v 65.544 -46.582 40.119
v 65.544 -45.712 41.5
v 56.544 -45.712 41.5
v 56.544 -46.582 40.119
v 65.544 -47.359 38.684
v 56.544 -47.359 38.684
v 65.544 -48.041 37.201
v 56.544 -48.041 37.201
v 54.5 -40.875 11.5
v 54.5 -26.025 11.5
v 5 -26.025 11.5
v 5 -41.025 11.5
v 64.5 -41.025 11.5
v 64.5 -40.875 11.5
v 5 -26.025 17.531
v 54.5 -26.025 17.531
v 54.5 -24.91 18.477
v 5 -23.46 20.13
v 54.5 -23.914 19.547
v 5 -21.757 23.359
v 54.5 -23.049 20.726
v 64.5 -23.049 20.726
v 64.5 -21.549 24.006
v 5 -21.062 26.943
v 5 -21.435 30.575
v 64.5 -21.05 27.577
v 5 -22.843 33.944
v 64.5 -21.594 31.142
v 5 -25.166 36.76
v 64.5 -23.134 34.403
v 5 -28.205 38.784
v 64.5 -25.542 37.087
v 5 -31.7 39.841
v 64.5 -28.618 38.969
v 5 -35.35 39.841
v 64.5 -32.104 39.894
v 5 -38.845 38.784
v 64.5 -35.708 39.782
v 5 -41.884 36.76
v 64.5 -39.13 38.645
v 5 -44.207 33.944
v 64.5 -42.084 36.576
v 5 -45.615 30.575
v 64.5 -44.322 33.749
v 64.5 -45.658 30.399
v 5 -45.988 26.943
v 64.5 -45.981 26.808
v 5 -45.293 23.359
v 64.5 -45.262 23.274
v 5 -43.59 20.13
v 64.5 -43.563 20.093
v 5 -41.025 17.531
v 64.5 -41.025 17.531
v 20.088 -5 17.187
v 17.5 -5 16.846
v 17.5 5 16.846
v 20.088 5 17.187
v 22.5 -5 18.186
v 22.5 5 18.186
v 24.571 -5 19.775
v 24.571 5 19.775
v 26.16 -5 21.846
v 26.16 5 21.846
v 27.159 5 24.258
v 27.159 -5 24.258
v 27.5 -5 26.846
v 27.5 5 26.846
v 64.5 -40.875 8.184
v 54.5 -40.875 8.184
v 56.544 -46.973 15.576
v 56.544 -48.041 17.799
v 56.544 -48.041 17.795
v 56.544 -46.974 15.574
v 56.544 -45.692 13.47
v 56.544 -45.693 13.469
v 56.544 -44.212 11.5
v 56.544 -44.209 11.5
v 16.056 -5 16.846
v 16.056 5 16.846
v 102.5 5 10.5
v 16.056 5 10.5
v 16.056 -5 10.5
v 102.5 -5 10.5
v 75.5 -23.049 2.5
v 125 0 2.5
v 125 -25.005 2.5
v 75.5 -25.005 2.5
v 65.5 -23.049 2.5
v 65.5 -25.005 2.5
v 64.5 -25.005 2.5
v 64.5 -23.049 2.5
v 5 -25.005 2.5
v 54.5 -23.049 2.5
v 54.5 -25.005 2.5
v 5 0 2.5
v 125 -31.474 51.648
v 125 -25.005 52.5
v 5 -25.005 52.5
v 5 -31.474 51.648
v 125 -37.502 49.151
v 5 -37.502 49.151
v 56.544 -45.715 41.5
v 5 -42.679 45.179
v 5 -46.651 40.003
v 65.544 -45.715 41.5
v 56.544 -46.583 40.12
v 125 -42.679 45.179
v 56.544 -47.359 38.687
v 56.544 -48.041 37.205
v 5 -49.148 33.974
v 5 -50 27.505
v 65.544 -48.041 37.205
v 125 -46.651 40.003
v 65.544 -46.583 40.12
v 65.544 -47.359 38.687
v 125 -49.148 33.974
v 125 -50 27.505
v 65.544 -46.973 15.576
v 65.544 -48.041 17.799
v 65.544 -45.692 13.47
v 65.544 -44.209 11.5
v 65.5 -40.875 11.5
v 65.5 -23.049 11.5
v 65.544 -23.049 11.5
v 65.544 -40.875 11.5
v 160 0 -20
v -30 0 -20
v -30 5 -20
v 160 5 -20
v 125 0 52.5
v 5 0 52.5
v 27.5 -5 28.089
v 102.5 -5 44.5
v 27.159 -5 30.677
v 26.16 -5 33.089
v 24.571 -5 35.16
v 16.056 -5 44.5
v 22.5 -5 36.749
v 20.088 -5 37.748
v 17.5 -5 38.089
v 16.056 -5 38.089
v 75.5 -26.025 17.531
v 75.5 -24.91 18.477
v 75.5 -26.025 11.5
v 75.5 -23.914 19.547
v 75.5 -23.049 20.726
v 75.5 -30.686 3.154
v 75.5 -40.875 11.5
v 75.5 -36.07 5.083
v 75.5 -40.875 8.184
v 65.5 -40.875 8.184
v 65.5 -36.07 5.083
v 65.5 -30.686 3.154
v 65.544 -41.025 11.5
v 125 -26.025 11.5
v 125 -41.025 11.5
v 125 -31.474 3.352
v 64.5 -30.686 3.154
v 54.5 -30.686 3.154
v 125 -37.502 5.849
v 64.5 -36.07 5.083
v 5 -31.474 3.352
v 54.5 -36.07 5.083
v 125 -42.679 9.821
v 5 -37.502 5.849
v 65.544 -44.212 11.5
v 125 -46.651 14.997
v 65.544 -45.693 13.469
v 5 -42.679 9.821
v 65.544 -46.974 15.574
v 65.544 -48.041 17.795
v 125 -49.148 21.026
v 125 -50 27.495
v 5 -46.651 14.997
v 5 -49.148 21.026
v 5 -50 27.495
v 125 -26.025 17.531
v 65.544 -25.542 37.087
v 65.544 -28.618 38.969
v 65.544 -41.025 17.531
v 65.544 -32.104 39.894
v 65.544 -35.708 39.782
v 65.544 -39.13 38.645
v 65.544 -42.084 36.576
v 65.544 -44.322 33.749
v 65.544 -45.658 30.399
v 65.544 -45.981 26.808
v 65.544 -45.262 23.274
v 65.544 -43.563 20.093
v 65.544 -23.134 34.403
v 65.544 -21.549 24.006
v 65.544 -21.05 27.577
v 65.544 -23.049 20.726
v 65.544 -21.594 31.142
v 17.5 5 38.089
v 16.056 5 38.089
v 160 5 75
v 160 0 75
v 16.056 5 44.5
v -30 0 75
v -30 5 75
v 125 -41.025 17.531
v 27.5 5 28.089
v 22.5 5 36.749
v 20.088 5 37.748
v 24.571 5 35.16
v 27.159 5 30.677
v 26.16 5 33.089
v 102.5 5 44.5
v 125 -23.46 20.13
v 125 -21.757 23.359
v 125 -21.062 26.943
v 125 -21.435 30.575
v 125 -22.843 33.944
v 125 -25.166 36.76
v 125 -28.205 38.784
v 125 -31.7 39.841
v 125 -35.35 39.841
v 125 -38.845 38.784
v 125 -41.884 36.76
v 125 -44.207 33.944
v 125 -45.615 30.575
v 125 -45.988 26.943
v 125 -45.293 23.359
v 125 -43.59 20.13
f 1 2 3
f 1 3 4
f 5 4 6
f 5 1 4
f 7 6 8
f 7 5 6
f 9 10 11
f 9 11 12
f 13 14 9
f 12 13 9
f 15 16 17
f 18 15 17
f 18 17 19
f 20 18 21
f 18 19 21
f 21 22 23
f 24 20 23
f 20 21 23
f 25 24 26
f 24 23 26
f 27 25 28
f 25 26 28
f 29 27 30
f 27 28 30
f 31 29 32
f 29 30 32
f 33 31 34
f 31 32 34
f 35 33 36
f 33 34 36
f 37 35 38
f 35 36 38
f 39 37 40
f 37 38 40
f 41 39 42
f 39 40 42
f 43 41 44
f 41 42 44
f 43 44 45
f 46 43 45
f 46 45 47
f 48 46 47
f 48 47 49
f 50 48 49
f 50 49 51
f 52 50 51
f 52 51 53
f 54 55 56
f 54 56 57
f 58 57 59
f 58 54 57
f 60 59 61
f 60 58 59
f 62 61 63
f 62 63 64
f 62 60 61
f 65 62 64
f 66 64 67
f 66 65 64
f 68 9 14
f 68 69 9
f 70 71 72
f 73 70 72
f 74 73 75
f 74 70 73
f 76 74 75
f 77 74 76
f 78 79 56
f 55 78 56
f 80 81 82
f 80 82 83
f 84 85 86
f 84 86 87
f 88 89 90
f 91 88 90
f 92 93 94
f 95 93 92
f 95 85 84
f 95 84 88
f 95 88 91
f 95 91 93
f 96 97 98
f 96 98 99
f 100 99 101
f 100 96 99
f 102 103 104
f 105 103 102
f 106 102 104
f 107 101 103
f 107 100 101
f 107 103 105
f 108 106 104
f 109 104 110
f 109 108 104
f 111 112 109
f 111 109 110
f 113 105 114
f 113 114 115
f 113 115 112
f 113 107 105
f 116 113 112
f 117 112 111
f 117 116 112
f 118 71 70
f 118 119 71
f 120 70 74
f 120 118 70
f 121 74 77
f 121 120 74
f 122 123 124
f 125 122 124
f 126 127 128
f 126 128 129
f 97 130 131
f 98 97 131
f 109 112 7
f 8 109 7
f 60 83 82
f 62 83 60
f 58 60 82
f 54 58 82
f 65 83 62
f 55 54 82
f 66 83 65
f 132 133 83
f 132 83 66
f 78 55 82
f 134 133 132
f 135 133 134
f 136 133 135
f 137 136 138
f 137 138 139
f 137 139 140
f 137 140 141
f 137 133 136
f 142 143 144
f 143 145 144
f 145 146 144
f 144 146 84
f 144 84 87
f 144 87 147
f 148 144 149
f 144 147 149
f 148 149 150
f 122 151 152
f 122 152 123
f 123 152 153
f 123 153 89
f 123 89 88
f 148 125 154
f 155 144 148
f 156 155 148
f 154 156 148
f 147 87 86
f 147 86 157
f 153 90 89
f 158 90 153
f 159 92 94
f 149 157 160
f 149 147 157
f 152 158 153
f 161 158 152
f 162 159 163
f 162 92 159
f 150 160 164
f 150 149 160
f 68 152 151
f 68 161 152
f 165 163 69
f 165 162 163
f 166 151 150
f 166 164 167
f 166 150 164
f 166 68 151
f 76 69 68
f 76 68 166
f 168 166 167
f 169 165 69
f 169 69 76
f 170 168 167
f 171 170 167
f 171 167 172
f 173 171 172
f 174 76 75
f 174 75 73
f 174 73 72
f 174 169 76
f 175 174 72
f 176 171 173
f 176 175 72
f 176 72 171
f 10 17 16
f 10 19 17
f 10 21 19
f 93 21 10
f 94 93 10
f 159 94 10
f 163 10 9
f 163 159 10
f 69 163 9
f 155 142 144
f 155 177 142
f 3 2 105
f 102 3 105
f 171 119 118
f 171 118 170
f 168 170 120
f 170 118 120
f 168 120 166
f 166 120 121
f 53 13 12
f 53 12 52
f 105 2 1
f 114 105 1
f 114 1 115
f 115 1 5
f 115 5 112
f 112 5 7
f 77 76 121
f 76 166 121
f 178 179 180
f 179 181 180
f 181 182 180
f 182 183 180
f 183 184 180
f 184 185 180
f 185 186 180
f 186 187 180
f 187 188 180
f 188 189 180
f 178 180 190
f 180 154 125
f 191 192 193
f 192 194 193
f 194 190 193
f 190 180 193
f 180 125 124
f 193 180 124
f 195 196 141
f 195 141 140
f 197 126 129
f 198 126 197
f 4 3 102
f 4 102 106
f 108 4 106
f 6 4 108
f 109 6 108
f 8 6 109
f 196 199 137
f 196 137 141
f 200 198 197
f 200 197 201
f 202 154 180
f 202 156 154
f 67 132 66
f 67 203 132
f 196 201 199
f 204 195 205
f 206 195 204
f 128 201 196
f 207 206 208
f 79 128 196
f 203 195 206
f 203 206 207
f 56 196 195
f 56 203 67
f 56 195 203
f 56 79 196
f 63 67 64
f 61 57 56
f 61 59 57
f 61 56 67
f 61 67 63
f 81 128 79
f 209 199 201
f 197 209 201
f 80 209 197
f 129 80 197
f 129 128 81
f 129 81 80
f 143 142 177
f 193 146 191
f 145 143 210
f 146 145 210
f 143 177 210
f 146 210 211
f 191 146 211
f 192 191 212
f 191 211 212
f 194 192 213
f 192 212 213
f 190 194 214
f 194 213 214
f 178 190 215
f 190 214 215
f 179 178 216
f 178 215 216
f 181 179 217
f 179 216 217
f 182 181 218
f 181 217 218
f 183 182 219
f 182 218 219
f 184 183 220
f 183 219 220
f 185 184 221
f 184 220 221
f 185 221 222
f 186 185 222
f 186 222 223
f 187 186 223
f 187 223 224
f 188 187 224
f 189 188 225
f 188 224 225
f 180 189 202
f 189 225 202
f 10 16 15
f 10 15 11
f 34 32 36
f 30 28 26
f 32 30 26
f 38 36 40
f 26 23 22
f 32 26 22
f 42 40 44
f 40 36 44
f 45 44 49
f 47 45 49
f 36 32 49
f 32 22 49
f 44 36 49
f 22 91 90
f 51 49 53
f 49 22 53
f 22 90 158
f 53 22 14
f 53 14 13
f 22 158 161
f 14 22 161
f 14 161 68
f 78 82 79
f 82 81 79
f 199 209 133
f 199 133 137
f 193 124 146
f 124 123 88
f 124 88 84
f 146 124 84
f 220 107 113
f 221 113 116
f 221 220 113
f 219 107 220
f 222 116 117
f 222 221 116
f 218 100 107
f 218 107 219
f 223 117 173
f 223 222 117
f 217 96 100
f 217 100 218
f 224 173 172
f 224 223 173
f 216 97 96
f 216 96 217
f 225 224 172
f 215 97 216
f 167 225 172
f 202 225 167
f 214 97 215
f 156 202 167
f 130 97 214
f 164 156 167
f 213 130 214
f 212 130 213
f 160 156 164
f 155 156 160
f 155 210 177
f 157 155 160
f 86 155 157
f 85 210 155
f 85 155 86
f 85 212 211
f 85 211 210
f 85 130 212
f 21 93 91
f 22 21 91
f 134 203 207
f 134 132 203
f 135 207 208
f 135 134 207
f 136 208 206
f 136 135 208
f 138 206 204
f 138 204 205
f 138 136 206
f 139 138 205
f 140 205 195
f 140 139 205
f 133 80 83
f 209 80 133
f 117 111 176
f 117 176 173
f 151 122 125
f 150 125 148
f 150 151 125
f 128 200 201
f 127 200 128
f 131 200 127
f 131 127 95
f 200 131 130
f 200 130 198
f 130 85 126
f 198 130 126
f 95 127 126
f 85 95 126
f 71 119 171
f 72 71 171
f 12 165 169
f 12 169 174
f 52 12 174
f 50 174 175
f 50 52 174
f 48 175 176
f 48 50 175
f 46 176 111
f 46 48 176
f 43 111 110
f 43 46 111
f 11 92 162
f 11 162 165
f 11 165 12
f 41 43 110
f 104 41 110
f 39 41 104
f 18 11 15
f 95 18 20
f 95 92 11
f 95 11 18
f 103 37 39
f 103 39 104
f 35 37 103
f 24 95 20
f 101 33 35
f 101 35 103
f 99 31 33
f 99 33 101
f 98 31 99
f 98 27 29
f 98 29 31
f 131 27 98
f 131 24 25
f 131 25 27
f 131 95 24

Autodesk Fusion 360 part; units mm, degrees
sketch "Boceto1" plane through (0, 0, 0) normal (0, 1, 0) x (1, 0, 0)
  line L0 (-30, 20) -> (160, 20)
  line L1 (160, 20) -> (160, -75)
  line L2 (160, -75) -> (-30, -75)
  line L3 (-30, -75) -> (-30, 20)
  dimension "d1" = 190
  dimension "d2" = 95
extrude "Extruir1" add sketch "Boceto1" along normal blind 5
sketch "Boceto2" plane through (0, 0, 0) normal (0, -1, 0) x (1, 0, 0)
  line L0 (160, 75) -> (-30, 75)
  line L1 (-30, 75) -> (-30, -20)
  line L2 (-30, -20) -> (160, -20)
  line L3 (160, -20) -> (160, 75)
  line L4 (-30, 27.5) -> (5, 27.5)
  line L5 (65, 52.5) -> (5, 52.5)
  line L6 (125, 27.5) -> (125, 2.5)
  line L7 (5, 52.5) -> (125, 52.5)
  line L8 (125, 52.5) -> (125, 2.5)
  line L9 (125, 2.5) -> (5, 2.5)
  line L10 (5, 2.5) -> (5, 52.5)
  point P0 (65, 27.5)
  dimension "d5" = 47.5
  dimension "d6" = 95
  dimension "d7" = 25
  dimension "d8" = 60
  dimension "d9" = 60
  dimension "d10" = 25
extrude "Extruir2" add sketch "Boceto2" along normal blind 50 contours L5 L6 L7 L8 L9 L10
sketch "Boceto3" plane through (125, 0, 0) normal (1, 0, 0) x (0, 0, -1)
  line L0 (-2.5, 0) -> (-52.5, 0)
  line L1 (-52.5, 0) -> (-52.5, -50)
  line L2 (-52.5, -50) -> (-2.5, -50)
  line L3 (-2.5, -50) -> (-2.5, 0)
  line L4 (-52.5, -50) -> (-27.5, -50)
  line L5 (-27.5, -50) -> (-27.5, -46)
  circle A0 centre (-27.5, -33.525) radius 12.475
  dimension "d13" = 25
  dimension "d14" = 4
  dimension "d15" = 24.95
extrude "Extruir3" cut sketch "Boceto3" against normal blind 150 contours A0
sketch "Boceto4" plane through (125, 0, 0) normal (1, 0, 0) x (0, 0, -1)
  circle A0 centre (-27.5, -33.525) radius 12.475
  line L0 (-2.5, 0) -> (-52.5, 0)
  line L1 (-52.5, 0) -> (-52.5, -50)
  line L2 (-52.5, -50) -> (-2.5, -50)
  line L3 (-2.5, -50) -> (-2.5, 0)
  line L4 (-27.5, -33.525) -> (-18.5, -33.525)
  line L5 (-18.5, -33.525) -> (-18.5, -26.025)
  line L6 (-18.5, -26.025) -> (-11.5, -26.025)
  line L7 (-11.5, -26.025) -> (-11.5, -41.025)
  line L8 (-11.5, -41.025) -> (-18.5, -41.025)
  line L9 (-18.5, -41.025) -> (-18.5, -26.025)
  dimension "d18" = 9
  dimension "d19" = 7.5
  dimension "d20" = 7
  dimension "d21" = 15
extrude "Extruir4" cut sketch "Boceto4" against normal blind 180 contours A0 L6 L7 L8
fillet "Empalme1" radius 25 2 edges at (65, -50, 2.5) (65, -50, 52.5)
sketch "Boceto5" plane through (0, 0, 0) normal (0, 0, 1) x (1, 0, 0)
  line L0 (64.5, -25) -> (64.5, -45)
  line L1 (68.5, -25) -> (68.5, -45)
  line L2 (65.5, -25) -> (65.5, -5)
  line L3 (64.5, -5) -> (64.5, -25)
  line L4 (64.5, -45) -> (54.5, -45)
  line L5 (54.5, -45) -> (64.5, -45)
  line L6 (64.5, -45) -> (64.5, -5)
  line L7 (64.5, -5) -> (54.5, -5)
  line L8 (54.5, -5) -> (54.5, -45)
  line L9 (68.5, -45) -> (75.5, -45)
  line L10 (75.5, -45) -> (65.5, -45)
  line L11 (65.5, -45) -> (65.5, -5)
  line L12 (65.5, -5) -> (75.5, -5)
  line L13 (75.5, -5) -> (75.5, -45)
  line L14 (54.5, -40.8747) -> (75.5, -40.8747)
  line L15 (54.5, -23.0491) -> (75.5, -23.0491)
  dimension "d33" = 20
  dimension "d35" = 20
  dimension "d36" = 10
  dimension "d37" = 7
  dimension "d38" = 10
extrude "Extruir5" cut sketch "Boceto5" along normal blind 31 contours L0 L3 L6 L8 L14 L15 | L2 L11 L13 L14 L15
sketch "Boceto6" plane through (0, 0, 11.5) normal (0, 0, 1) x (1, 0, 0)
  line L0 (54.5, -40.8747) -> (54.5, -26.025)
  line L1 (54.5, -26.025) -> (5, -26.025)
  line L2 (5, -26.025) -> (5, -41.025)
  line L3 (5, -41.025) -> (125, -41.025)
  line L4 (125, -41.025) -> (125, -26.025)
  line L5 (125, -26.025) -> (75.5, -26.025)
  line L6 (75.5, -26.025) -> (75.5, -40.8747)
  line L7 (75.5, -40.8747) -> (65.5, -40.8747)
  line L8 (65.5, -40.8747) -> (65.5, -26.025)
  line L9 (65.5, -26.025) -> (64.5, -26.025)
  line L10 (64.5, -26.025) -> (64.5, -40.8747)
  line L11 (64.5, -40.8747) -> (54.5, -40.8747)
  line L12 (64.5, -48.0409) -> (65.5441, -48.0409)
  line L13 (65.5441, -48.0409) -> (65.5441, -10.5894)
  line L14 (65.5441, -10.5894) -> (64.5, -10.5894)
  line L15 (64.5, -10.5894) -> (64.5, -48.0409)
extrude "Extruir6" add sketch "Boceto6" along normal blind 30 contours L3 L7 L8 L9 L10 L13 L15 | L7 L8 L9 L13 L14 L15 | L3 L12 L13 L15
sketch "Boceto7" plane through (65.5441, 0, 0) normal (1, 0, 0) x (0, 0, -1)
  arc A0 (-17.7987, -48.0409) -> (-11.5, -44.2094) centre (-27.5, -25) ccw
  line L0 (-17.7987, -48.0409) -> (-11.5, -48.0409)
  line L1 (-11.5, -48.0409) -> (-11.5, -44.2094)
  arc A1 (-41.5, -45.7123) -> (-37.2013, -48.0409) centre (-27.5, -25) ccw
  line L2 (-41.5, -45.7123) -> (-41.5, -48.0409)
  line L3 (-41.5, -48.0409) -> (-37.2013, -48.0409)
extrude "Extruir7" cut sketch "Boceto7" against normal blind 9
sketch "Boceto8" plane through (125, 0, 0) normal (1, 0, 0) x (0, 0, -1)
  line L0 (-11.5, -41.025) -> (-17.5313, -41.025)
  arc A0 (-17.5313, -26.025) -> (-17.5313, -41.025) centre (-27.5, -33.525) ccw
  line L1 (-17.5313, -26.025) -> (-11.5, -26.025)
  line L2 (-11.5, -26.025) -> (-11.5, -41.025)
  arc A1 (-52.5, -25) -> (-2.5, -25) centre (-27.5, -25) ccw
  line L3 (-2.5, -25) -> (-2.5, 0)
  line L4 (-2.5, 0) -> (-52.5, 0)
  line L5 (-52.5, 0) -> (-52.5, -25)
  line L6 (-27.5, -33.525) -> (-27.5, -48)
sketch "Boceto9" plane through (0, 5, 0) normal (0, 1, 0) x (-1, 0, 0)
  line L0 (30, 75) -> (-160, 75)
  line L1 (-160, 75) -> (-160, -20)
  line L2 (-160, -20) -> (30, -20)
  line L3 (30, -20) -> (30, 75)
  line L4 (30, 75) -> (30, 27.5)
  line L5 (30, 27.5) -> (-65, 27.5)
  line L6 (-65, 27.5) -> (-102.5, 27.5)
  line L7 (-102.5, 27.5) -> (-102.5, 44.5)
  line L8 (-102.5, 44.5) -> (-27.5, 44.5)
  line L9 (-27.5, 44.5) -> (-27.5, 10.5)
  line L10 (-27.5, 10.5) -> (-102.5, 10.5)
  line L11 (-102.5, 10.5) -> (-102.5, 44.5)
  dimension "d47" = 47.5
  dimension "d48" = 95
  dimension "d49" = 37.5
  dimension "d50" = 17
  dimension "d51" = 34
  dimension "d52" = 75
extrude "Extruir8" cut sketch "Boceto9" against normal blind 10 contours L5 L6 L9 L10 L11 | L5 L6 L7 L8 L9 L11
sketch "Boceto10" plane through (0, 5, 0) normal (0, 1, 0) x (-1, 0, 0)
  line L0 (-27.5, 44.5) -> (-27.5, 10.5)
  line L1 (-27.5, 10.5) -> (-102.5, 10.5)
  line L2 (-102.5, 10.5) -> (-102.5, 44.5)
  line L3 (-102.5, 44.5) -> (-27.5, 44.5)
  line L4 (30, 75) -> (-160, 75)
  line L5 (-160, 75) -> (-160, -20)
  line L6 (-160, -20) -> (30, -20)
  line L7 (30, -20) -> (30, 75)
  line L8 (-27.5, 44.5) -> (-16.0562, 44.5)
  line L9 (-16.0562, 44.5) -> (-16.0562, 38.0888)
  line L10 (-16.0562, 38.0888) -> (-27.5, 38.0888)
  line L11 (-27.5, 38.0888) -> (-27.5, 44.5)
  line L12 (-27.5, 10.5) -> (-16.0562, 10.5)
  line L13 (-16.0562, 10.5) -> (-16.0562, 16.8458)
  line L14 (-16.0562, 16.8458) -> (-27.5, 16.8458)
  line L15 (-27.5, 16.8458) -> (-27.5, 10.5)
extrude "Extruir9" cut sketch "Boceto10" against normal blind 10 contours L0 L8 L9 L10 L11 | L0 L12 L13 L14 L15
fillet "Empalme2" radius 10 2 edges at (27.5, 0, 16.8458) (27.5, 0, 38.0888)
sketch "Boceto11" plane through (0, 5, 0) normal (0, 1, 0) x (-1, 0, 0)
  arc A0 (-17.5, 38.0888) -> (-27.5, 28.0888) centre (-17.5, 28.0888) ccw
  line L0 (-27.5, 28.0888) -> (-27.5, 26.8458)
  arc A1 (-27.5, 26.8458) -> (-17.5, 16.8458) centre (-17.5, 26.8458) ccw
  line L1 (-17.5, 16.8458) -> (-16.0562, 16.8458)
  line L2 (-16.0562, 16.8458) -> (-16.0562, 10.5)
  line L3 (-16.0562, 10.5) -> (-102.5, 10.5)
  line L4 (-102.5, 10.5) -> (-102.5, 44.5)
  line L5 (-102.5, 44.5) -> (-16.0562, 44.5)
  line L6 (-16.0562, 44.5) -> (-16.0562, 38.0888)
  line L7 (-16.0562, 38.0888) -> (-17.5, 38.0888)
  line L8 (30, 75) -> (-160, 75)
  line L9 (-160, 75) -> (-160, -20)
  line L10 (-160, -20) -> (30, -20)
  line L11 (30, -20) -> (30, 75)
